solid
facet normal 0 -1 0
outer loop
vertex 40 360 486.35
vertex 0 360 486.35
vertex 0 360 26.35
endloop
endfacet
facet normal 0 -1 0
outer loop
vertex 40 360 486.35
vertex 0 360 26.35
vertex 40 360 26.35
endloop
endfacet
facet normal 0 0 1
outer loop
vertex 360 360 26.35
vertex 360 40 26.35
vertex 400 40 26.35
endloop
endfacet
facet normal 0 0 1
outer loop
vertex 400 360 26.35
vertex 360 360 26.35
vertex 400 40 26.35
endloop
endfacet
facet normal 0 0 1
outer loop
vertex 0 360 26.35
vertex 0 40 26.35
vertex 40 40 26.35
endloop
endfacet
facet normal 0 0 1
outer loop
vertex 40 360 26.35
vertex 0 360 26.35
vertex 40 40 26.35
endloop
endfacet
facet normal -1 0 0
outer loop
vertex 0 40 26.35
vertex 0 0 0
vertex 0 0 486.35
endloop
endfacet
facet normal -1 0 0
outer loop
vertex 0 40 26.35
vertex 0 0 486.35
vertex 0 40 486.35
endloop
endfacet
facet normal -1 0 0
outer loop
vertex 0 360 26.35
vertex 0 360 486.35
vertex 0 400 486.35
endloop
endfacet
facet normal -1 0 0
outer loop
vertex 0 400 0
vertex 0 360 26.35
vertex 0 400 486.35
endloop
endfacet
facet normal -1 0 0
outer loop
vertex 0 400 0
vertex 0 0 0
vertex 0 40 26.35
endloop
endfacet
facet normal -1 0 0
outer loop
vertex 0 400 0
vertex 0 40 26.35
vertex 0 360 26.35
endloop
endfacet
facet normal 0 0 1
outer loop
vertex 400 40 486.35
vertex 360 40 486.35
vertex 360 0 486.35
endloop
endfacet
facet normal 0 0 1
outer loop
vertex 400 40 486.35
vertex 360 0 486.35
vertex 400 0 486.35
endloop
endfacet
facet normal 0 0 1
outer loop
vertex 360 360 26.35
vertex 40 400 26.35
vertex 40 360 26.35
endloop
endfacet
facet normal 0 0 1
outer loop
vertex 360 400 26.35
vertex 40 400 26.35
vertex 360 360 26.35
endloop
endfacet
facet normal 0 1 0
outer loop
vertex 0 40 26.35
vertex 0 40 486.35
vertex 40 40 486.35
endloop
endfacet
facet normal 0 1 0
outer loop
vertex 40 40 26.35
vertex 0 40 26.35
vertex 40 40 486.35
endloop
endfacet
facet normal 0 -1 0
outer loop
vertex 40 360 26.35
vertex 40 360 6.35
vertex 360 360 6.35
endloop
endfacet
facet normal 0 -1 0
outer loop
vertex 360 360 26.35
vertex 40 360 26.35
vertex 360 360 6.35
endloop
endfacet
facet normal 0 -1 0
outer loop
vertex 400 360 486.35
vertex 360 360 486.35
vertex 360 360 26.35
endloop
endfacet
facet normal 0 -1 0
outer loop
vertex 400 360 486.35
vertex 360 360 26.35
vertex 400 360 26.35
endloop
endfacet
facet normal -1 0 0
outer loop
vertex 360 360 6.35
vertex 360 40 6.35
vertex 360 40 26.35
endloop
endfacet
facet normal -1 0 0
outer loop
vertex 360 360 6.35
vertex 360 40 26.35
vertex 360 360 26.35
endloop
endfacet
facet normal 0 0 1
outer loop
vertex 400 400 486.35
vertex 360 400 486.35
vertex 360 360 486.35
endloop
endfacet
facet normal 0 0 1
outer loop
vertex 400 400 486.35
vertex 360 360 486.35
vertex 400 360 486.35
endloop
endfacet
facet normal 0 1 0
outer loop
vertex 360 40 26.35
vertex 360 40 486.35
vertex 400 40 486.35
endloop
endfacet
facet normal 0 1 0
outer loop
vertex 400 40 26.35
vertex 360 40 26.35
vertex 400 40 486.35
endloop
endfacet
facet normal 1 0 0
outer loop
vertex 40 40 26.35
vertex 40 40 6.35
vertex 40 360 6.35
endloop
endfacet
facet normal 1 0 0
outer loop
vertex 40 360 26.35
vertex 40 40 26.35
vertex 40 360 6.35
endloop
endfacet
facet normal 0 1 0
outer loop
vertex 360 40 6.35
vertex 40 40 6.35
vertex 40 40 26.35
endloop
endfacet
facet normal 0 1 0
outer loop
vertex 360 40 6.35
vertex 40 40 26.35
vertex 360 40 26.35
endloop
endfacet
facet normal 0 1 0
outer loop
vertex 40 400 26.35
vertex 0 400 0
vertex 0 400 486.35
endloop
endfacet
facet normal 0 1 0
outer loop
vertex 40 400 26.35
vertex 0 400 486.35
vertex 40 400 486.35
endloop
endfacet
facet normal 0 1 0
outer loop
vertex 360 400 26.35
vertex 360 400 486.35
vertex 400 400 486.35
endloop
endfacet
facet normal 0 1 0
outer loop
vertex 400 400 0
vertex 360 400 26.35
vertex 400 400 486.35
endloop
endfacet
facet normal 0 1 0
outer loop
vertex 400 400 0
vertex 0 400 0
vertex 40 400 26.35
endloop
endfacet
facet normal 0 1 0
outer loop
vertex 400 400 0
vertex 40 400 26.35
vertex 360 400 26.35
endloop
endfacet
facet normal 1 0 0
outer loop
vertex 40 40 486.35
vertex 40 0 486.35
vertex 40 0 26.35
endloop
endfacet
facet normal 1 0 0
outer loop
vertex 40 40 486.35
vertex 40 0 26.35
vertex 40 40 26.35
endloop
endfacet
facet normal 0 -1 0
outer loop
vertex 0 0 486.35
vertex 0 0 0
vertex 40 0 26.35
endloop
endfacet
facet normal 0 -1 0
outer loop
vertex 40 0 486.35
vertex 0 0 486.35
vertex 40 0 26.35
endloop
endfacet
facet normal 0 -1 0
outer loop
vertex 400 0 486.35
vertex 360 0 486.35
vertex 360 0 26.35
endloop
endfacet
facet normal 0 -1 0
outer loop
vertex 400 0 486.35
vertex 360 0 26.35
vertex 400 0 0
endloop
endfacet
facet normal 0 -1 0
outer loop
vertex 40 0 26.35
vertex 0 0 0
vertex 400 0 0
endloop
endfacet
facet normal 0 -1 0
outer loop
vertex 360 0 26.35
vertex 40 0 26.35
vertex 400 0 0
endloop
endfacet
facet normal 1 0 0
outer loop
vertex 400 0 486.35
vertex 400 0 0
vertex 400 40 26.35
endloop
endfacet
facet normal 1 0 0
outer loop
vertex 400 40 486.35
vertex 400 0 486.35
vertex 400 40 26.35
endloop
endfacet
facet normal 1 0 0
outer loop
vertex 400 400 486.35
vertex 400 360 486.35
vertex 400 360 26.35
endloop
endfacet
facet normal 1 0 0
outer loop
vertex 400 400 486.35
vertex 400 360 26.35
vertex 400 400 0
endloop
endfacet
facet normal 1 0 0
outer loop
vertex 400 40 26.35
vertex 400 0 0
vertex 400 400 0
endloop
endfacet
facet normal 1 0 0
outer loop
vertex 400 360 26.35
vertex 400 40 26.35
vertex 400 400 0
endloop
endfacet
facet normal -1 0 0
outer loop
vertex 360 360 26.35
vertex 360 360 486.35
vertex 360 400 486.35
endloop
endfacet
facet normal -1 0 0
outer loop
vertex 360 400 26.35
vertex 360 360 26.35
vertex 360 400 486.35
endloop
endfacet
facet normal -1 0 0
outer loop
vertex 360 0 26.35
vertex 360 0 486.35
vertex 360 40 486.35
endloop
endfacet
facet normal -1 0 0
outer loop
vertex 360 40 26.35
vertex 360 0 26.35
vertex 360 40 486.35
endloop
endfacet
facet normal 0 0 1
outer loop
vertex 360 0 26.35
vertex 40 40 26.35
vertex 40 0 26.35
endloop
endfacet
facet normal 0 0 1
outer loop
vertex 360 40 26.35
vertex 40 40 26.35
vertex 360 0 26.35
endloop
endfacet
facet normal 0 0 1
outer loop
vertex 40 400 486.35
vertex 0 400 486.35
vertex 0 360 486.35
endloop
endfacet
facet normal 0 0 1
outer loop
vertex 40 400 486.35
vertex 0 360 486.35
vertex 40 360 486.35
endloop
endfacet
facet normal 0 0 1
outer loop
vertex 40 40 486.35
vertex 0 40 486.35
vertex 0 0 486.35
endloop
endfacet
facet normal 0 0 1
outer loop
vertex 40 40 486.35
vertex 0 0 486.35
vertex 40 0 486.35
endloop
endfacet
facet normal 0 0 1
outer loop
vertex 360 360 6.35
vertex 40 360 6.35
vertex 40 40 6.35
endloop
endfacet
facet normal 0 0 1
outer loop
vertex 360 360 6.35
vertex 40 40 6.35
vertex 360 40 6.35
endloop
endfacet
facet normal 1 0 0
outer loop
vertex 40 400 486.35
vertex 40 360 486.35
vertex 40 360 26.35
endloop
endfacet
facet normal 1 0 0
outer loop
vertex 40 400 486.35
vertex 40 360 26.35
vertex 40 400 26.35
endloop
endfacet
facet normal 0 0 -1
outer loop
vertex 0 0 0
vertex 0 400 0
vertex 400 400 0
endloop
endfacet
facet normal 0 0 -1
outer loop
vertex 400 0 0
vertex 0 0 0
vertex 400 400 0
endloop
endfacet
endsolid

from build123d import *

# Parameters (mm, degrees)
F0_W     = 400
F0_H     = 400
F1_DEPTH = 6.35
F2_W     = 400
F2_H     = 400
F2_W_2   = 320
F2_H_2   = 320
F3_DEPTH = 20
F4_W     = 40
F4_H     = 40
F5_DEPTH = 460


# Not quite as in the source:
# - a length typed as a fraction of an inch, garbled in the dataset ("3 / 203.2 mm" for 3/8 in), is restored


with BuildPart() as f1:
    # F0 (on Top) → F1 (new body)
    with BuildSketch(Plane.XY):
        with Locations((200, 200)):
            Rectangle(F0_W, F0_H)
    extrude(amount=F1_DEPTH)

    # F2 (on face) → F3 (join)
    with BuildSketch(Plane.XY.offset(6.35)):
        with Locations((200, 200)):
            Rectangle(F2_W, F2_H)
        with Locations((200, 200)):
            Rectangle(F2_W_2, F2_H_2, mode=Mode.SUBTRACT)
    extrude(amount=F3_DEPTH)

    # F4 (on face) → F5 (join)
    with BuildSketch(Plane.XY.offset(26.35)):
        with Locations((20, 380)):
            Rectangle(F4_W, F4_H)
        with Locations((380, 380)):
            Rectangle(F4_W, F4_H)
        with Locations((380, 20)):
            Rectangle(F4_W, F4_H)
        with Locations((20, 20)):
            Rectangle(F4_W, F4_H)
    extrude(amount=F5_DEPTH)


solid = f1.part
